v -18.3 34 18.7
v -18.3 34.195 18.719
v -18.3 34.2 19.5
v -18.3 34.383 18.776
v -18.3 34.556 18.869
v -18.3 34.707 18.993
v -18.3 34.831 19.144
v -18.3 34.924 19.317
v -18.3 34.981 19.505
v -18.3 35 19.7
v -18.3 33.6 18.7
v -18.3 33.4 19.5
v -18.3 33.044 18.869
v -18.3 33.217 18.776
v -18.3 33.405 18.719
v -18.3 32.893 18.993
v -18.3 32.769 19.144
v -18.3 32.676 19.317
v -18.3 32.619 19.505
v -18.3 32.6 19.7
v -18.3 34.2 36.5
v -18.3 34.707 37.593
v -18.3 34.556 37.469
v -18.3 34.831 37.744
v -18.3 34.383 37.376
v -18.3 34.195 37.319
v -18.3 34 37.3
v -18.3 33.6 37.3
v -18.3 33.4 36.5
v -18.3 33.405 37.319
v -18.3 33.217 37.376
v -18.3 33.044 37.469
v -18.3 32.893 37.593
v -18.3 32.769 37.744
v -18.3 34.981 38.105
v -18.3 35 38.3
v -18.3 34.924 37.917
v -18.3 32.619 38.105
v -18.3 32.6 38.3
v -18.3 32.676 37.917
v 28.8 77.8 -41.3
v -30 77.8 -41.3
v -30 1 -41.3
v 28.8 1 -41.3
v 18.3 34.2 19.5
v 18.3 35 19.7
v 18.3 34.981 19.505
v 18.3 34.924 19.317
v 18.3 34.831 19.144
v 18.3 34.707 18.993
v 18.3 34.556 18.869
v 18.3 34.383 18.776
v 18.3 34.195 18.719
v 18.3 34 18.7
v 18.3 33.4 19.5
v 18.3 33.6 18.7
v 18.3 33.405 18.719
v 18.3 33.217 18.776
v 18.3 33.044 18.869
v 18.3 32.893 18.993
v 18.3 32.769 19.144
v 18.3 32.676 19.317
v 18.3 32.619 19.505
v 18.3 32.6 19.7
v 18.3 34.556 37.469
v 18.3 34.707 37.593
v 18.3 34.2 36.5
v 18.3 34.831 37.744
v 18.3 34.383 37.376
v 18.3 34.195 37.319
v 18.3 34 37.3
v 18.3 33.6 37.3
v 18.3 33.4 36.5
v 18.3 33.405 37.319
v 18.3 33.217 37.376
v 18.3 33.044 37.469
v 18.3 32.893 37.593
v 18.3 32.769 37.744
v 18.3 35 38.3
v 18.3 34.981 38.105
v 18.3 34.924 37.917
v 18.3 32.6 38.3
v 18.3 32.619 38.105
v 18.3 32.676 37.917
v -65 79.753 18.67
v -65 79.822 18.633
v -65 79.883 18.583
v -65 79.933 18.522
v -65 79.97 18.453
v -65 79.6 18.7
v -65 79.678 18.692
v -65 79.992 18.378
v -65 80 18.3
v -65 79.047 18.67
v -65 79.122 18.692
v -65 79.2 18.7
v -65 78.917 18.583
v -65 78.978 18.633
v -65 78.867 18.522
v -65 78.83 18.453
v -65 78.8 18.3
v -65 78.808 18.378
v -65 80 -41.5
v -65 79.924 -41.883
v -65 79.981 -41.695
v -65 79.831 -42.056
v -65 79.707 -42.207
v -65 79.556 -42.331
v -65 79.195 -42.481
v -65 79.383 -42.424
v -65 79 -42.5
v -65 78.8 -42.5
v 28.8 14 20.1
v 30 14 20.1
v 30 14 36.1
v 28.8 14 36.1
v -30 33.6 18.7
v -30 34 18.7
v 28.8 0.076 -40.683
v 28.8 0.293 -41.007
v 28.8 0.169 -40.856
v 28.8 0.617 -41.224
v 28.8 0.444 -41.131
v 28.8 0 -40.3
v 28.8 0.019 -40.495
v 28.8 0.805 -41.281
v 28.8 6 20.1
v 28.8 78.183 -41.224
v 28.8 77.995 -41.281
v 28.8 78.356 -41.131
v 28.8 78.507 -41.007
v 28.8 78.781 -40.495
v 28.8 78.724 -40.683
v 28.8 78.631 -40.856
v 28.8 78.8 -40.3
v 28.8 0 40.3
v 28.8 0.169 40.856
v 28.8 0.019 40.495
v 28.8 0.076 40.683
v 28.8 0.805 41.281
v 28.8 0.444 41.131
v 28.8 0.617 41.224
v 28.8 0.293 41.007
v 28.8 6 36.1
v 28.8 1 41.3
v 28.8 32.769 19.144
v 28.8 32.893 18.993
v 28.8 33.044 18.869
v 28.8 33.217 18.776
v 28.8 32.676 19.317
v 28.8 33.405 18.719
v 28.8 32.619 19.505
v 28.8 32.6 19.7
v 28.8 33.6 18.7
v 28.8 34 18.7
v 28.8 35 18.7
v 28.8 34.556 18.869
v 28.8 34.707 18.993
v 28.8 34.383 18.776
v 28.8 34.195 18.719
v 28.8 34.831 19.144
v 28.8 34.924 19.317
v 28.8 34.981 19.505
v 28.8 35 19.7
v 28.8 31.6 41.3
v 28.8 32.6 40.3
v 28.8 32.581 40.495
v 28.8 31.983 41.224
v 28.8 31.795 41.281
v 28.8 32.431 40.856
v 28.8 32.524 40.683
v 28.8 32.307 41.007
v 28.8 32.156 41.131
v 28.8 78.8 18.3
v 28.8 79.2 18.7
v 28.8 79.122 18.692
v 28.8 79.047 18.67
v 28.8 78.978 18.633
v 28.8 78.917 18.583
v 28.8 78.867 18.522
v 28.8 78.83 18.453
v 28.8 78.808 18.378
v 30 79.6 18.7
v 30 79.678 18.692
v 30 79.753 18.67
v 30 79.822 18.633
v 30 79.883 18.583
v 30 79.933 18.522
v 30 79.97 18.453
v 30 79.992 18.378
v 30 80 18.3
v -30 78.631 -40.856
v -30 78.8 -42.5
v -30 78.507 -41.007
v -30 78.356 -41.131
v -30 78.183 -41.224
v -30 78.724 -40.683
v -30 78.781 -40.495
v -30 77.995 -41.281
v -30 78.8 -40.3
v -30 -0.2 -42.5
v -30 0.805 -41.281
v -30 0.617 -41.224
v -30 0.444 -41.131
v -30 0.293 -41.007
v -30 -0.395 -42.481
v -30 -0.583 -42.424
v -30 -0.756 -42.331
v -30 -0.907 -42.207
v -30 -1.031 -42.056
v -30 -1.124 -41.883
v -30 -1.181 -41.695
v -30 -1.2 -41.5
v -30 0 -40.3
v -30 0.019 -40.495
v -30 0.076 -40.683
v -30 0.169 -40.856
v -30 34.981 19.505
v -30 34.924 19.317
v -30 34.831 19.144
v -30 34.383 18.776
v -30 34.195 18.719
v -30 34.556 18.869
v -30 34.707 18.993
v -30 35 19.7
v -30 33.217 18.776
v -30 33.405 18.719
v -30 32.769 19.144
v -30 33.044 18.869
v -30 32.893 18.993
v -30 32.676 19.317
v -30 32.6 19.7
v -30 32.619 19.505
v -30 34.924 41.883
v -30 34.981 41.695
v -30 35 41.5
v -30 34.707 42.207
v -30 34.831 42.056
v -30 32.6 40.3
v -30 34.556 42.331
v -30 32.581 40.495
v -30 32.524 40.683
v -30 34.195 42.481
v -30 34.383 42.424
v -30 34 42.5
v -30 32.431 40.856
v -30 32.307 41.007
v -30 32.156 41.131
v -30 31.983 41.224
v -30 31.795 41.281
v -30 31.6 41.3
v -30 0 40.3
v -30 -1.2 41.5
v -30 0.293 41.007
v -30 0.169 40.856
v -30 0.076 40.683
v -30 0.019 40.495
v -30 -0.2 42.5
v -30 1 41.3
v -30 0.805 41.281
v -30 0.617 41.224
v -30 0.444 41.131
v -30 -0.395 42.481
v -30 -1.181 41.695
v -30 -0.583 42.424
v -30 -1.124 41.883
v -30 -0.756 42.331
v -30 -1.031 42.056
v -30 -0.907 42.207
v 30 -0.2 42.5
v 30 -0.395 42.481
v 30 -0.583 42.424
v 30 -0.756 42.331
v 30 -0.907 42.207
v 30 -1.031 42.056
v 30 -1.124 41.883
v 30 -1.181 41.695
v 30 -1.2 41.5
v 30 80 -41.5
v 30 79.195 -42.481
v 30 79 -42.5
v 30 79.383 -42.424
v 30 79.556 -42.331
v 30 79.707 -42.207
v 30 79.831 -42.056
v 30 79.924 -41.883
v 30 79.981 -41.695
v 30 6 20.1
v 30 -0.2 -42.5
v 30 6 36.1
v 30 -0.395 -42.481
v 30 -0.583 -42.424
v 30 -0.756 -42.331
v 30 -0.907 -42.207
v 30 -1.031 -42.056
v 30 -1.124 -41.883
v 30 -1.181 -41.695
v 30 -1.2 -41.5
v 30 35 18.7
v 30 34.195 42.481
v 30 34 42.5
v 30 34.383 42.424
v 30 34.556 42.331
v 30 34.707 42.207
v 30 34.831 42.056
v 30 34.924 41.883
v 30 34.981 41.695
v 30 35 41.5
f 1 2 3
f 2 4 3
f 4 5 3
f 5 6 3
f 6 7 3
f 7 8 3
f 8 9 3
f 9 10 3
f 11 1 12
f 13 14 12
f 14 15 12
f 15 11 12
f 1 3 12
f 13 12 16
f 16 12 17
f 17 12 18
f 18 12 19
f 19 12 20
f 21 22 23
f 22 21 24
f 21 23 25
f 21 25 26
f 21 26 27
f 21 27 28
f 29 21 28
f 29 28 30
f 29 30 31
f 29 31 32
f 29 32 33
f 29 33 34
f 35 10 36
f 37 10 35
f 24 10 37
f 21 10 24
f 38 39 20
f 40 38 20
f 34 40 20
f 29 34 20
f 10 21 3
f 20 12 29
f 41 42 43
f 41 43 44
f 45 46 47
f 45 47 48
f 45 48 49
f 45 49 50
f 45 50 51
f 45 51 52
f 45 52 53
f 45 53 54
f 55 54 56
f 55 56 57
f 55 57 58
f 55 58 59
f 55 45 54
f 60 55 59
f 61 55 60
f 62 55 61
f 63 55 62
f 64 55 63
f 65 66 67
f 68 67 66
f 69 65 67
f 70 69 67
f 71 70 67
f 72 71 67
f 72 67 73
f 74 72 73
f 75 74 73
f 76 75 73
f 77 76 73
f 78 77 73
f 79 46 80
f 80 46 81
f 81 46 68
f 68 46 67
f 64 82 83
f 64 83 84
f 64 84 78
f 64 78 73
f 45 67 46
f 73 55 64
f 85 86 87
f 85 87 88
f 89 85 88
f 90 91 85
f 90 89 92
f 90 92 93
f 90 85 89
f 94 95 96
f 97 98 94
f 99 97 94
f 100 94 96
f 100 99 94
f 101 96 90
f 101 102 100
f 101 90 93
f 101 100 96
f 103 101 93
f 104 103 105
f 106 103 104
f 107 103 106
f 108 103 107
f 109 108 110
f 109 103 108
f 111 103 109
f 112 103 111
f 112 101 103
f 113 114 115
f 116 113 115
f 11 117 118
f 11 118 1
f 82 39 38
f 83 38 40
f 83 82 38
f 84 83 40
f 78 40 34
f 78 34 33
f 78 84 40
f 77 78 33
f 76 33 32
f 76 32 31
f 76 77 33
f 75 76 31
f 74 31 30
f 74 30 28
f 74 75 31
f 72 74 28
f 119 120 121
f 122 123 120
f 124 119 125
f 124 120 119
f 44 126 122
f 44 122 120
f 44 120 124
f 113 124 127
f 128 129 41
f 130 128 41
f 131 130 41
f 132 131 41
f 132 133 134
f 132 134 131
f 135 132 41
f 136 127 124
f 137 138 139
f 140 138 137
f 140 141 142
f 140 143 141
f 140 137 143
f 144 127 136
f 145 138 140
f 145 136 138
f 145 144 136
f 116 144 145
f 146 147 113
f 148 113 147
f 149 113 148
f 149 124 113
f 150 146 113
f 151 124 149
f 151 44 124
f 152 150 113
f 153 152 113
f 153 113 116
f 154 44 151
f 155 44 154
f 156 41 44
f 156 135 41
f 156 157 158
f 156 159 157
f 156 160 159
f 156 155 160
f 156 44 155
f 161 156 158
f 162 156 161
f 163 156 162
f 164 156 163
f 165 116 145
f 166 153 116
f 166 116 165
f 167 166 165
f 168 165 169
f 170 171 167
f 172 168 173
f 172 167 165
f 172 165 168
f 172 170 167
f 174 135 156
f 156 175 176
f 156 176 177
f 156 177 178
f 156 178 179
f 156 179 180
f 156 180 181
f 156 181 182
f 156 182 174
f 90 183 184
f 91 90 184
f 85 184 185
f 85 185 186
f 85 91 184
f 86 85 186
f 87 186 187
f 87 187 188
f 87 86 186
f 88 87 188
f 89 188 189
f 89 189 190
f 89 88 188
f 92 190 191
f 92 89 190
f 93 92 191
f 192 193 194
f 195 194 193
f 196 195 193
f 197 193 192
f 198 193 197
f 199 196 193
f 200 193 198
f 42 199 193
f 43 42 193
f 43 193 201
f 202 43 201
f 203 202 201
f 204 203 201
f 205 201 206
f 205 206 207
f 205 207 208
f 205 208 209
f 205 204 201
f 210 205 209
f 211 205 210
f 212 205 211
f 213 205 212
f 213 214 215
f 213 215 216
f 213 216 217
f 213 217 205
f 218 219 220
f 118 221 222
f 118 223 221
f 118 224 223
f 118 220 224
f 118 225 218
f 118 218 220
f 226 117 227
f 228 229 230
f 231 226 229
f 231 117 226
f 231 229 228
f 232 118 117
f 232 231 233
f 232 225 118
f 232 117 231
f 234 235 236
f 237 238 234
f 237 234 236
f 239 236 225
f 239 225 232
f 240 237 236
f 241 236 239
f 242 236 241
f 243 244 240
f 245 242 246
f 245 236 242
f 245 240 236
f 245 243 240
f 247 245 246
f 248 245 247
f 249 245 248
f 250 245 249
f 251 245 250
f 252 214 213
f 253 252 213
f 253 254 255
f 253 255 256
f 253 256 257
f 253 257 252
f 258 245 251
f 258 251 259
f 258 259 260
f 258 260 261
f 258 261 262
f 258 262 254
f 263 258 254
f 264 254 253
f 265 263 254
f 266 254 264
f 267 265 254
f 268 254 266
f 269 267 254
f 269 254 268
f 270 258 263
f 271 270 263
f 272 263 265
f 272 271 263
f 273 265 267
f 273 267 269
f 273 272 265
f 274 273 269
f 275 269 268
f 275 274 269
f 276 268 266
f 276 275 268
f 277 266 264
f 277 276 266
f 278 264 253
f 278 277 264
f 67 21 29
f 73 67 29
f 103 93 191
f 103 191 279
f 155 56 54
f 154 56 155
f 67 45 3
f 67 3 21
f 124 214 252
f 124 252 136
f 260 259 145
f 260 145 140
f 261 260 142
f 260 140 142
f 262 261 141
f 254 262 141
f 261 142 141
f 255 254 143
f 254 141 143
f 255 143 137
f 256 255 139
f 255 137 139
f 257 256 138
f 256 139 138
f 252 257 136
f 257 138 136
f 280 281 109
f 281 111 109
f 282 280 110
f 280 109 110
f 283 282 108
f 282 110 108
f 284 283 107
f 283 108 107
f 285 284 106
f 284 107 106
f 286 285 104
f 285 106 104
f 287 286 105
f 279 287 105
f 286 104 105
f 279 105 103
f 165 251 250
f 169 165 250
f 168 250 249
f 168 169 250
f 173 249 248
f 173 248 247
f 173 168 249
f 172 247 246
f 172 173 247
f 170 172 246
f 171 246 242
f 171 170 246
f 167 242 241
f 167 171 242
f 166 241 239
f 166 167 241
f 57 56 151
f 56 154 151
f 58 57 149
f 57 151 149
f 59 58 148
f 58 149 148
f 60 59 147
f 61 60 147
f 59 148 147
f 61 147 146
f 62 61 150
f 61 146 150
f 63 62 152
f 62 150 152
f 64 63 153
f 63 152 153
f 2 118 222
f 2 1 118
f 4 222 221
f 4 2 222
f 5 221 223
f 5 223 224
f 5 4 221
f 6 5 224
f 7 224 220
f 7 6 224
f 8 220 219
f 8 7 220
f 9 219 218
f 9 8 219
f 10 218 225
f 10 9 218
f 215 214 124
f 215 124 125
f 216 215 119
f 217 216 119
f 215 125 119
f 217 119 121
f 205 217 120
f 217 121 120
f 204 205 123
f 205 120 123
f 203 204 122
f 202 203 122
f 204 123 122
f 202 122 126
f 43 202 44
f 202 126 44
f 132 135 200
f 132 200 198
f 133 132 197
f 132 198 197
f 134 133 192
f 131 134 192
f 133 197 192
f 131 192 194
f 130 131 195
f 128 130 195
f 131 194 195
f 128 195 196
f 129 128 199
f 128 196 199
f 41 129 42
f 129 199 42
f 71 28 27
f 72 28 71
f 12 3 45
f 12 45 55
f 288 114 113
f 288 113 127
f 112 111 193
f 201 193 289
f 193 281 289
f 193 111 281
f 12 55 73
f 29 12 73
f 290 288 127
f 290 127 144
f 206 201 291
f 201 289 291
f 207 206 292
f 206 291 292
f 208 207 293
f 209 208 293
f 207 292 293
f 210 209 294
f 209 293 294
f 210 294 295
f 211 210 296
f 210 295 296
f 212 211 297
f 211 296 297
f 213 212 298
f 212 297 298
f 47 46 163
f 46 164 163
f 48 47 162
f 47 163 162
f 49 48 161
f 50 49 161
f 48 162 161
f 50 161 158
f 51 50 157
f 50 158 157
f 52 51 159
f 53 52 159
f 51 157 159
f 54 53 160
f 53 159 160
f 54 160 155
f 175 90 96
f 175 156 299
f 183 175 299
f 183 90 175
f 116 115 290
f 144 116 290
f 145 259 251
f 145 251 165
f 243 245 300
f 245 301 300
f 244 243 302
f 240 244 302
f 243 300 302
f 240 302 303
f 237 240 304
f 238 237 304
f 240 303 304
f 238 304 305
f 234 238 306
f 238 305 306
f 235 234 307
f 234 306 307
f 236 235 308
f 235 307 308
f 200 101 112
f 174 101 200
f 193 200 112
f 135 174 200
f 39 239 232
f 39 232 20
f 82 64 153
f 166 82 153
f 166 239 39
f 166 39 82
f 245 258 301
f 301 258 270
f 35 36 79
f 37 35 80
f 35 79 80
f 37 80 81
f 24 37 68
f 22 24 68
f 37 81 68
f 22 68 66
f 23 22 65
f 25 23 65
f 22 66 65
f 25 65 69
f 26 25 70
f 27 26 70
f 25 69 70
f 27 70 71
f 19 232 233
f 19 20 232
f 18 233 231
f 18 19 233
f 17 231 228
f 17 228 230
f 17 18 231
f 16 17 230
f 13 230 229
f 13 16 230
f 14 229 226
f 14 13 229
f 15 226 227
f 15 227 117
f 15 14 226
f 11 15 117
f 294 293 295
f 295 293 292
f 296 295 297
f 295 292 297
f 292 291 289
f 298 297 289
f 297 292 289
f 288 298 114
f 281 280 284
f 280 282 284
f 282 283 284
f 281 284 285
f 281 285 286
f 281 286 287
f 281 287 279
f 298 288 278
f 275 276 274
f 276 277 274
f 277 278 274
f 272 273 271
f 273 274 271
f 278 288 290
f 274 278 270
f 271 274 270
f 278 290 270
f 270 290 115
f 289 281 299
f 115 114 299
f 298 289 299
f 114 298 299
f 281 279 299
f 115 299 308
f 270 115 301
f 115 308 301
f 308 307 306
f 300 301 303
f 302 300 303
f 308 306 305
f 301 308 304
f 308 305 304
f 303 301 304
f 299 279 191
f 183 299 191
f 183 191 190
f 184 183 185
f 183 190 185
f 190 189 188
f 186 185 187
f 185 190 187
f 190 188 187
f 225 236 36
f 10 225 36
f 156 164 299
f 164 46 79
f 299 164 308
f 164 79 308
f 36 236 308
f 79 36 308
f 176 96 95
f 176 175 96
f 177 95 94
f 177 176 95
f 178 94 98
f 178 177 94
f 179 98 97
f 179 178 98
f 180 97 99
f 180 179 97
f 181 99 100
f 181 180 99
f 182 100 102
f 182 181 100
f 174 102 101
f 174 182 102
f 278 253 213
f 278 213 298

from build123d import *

# Parameters (mm, degrees)
SKETCH_W     = 60
SKETCH_H     = 85
PAD_DEPTH    = 1.2
SKETCH002_W  = 60
SKETCH002_H  = 1.2
PAD001_DEPTH = 80
SKETCH003_W  = 60
SKETCH003_H  = 1.2
PAD002_DEPTH = 60
SKETCH004_W  = 60
SKETCH004_H  = 1.2
PAD003_DEPTH = 35
SKETCH006_W  = 60
SKETCH006_H  = 2.4
PAD004_DEPTH = 4
SKETCH005_W  = 11.7
SKETCH005_H  = 2.4
PAD005_DEPTH = 18.6
SKETCH007_W  = 17
SKETCH007_H  = 0.8
PAD006_DEPTH = 36.6
SKETCH009_W  = 61.2
SKETCH009_H  = 1.2
PAD007_DEPTH = 35
SKETCH010_W  = 1.2
SKETCH010_H  = 60
PAD008_DEPTH = 78.8
SKETCH011_W  = 1.2
SKETCH011_H  = 22.6
PAD009_DEPTH = 32.6
FILLET_R     = 1
FILLET001_R  = 1
FILLET002_R  = 1
FILLET003_R  = 1
FILLET004_R  = 1
FILLET005_R  = 1
FILLET006_R  = 1
FILLET007_R  = 1
FILLET008_R  = 1
FILLET009_R  = 1
FILLET010_R  = 1
FILLET011_R  = 1
FILLET012_R  = 1
FILLET013_R  = 1
FILLET014_R  = 0.4
FILLET015_R  = 0.4
SKETCH012_W  = 16
SKETCH012_H  = 8
POCKET_DEPTH = 95.001


with BuildPart() as part:
    # Sketch → Pad (new body)
    with BuildSketch(Plane.XZ):
        Rectangle(SKETCH_W, SKETCH_H)
    extrude(amount=PAD_DEPTH)

    # Sketch002 (on Face5 of Pad) → Pad001 (join)
    with BuildSketch(Plane(origin=(0, 0, 0), x_dir=(1, 0, 0), z_dir=(0, 1, 0))):
        with Locations((0, 41.9)):
            Rectangle(SKETCH002_W, SKETCH002_H)
    extrude(amount=PAD001_DEPTH)

    # Sketch003 (on Face4 of Pad001) → Pad002 (join)
    with BuildSketch(Plane(origin=(0, 0, -41.3), x_dir=(-1, 0, 0), z_dir=(0, 0, 1))):
        with Locations((0, -79.4)):
            Rectangle(SKETCH003_W, SKETCH003_H)
    extrude(amount=PAD002_DEPTH)

    # Sketch004 (on Face2 of Pad002) → Pad003 (join)
    with BuildSketch(Plane(origin=(0, 0, 0), x_dir=(1, 0, 0), z_dir=(0, 1, 0))):
        with Locations((0, -41.9)):
            Rectangle(SKETCH004_W, SKETCH004_H)
    extrude(amount=PAD003_DEPTH)

    # Sketch006 (on Face7 of Pad003) → Pad004 (join)
    with BuildSketch(Plane(origin=(0, 0, 41.3), x_dir=(1, 0, 0), z_dir=(0, 0, -1))):
        with Locations((0, -33.8)):
            Rectangle(SKETCH006_W, SKETCH006_H)
    extrude(amount=PAD004_DEPTH)

    # Sketch005 (on Face11 of Pad004) → Pad005 (join)
    with BuildSketch(Plane(origin=(0, 0, 37.3), x_dir=(1, 0, 0), z_dir=(0, 0, -1))):
        with Locations((24.15, -33.8)):
            Rectangle(SKETCH005_W, SKETCH005_H)
        with Locations((-24.15, -33.8)):
            Rectangle(SKETCH005_W, SKETCH005_H)
    extrude(amount=PAD005_DEPTH)

    # Sketch007 (on Face12 of Pad005) → Pad006 (join)
    with BuildSketch(Plane(origin=(-18.3, 0, 0), x_dir=(0, 0, 1), z_dir=(1, 0, 0))):
        with Locations((28, -33.8)):
            Rectangle(SKETCH007_W, SKETCH007_H)
    extrude(amount=PAD006_DEPTH)

    # Sketch009 (on Face2 of Pad006) → Pad007 (join)
    with BuildSketch(Plane(origin=(-30, 0, 0), x_dir=(0, 0, -1), z_dir=(-1, 0, 0))):
        with Locations((11.9, -79.4)):
            Rectangle(SKETCH009_W, SKETCH009_H)
    extrude(amount=PAD007_DEPTH)

    # Sketch010 (on Face22 of Pad007) → Pad008 (join)
    with BuildSketch(Plane.XZ.offset(-78.8)):
        with Locations((29.4, -11.3)):
            Rectangle(SKETCH010_W, SKETCH010_H)
    extrude(amount=PAD008_DEPTH)

    # Sketch011 (on Face9 of Pad008) → Pad009 (join)
    with BuildSketch(Plane.XZ.offset(-32.6)):
        with Locations((29.4, 30)):
            Rectangle(SKETCH011_W, SKETCH011_H)
    extrude(amount=PAD009_DEPTH)

    # Fillet
    fillet_edges = [part.edges().sort_by_distance(p)[0] for p in [
        (0, 35, 42.5),
    ]]
    fillet(fillet_edges, radius=FILLET_R)

    # Fillet001
    fillet001_edges = [part.edges().sort_by_distance(p)[0] for p in [
        (0, -1.2, 42.5),
    ]]
    fillet(fillet001_edges, radius=FILLET001_R)

    # Fillet002
    fillet002_edges = [part.edges().sort_by_distance(p)[0] for p in [
        (-0.6, 0, 41.3),
    ]]
    fillet(fillet002_edges, radius=FILLET002_R)

    # Fillet003
    fillet003_edges = [part.edges().sort_by_distance(p)[0] for p in [
        (-0.6, 32.6, 41.3),
    ]]
    fillet(fillet003_edges, radius=FILLET003_R)

    # Fillet004
    fillet004_edges = [part.edges().sort_by_distance(p)[0] for p in [
        (-24.15, 32.6, 18.7),
    ]]
    fillet(fillet004_edges, radius=FILLET004_R)

    # Fillet005
    fillet005_edges = [part.edges().sort_by_distance(p)[0] for p in [
        (-24.15, 35, 18.7),
    ]]
    fillet(fillet005_edges, radius=FILLET005_R)

    # Fillet006
    fillet006_edges = [part.edges().sort_by_distance(p)[0] for p in [
        (23.55, 35, 18.7),
    ]]
    fillet(fillet006_edges, radius=FILLET006_R)

    # Fillet007
    fillet007_edges = [part.edges().sort_by_distance(p)[0] for p in [
        (23.55, 32.6, 18.7),
    ]]
    fillet(fillet007_edges, radius=FILLET007_R)

    # Fillet008
    fillet008_edges = [part.edges().sort_by_distance(p)[0] for p in [
        (0, 32.6, 37.3),
    ]]
    fillet(fillet008_edges, radius=FILLET008_R)

    # Fillet009
    fillet009_edges = [part.edges().sort_by_distance(p)[0] for p in [
        (0, 35, 37.3),
    ]]
    fillet(fillet009_edges, radius=FILLET009_R)

    # Fillet010
    fillet010_edges = [part.edges().sort_by_distance(p)[0] for p in [
        (0, -1.2, -42.5),
    ]]
    fillet(fillet010_edges, radius=FILLET010_R)

    # Fillet011
    fillet011_edges = [part.edges().sort_by_distance(p)[0] for p in [
        (-17.5, 80, -42.5),
    ]]
    fillet(fillet011_edges, radius=FILLET011_R)

    # Fillet012
    fillet012_edges = [part.edges().sort_by_distance(p)[0] for p in [
        (-0.6, 78.8, -41.3),
    ]]
    fillet(fillet012_edges, radius=FILLET012_R)

    # Fillet013
    fillet013_edges = [part.edges().sort_by_distance(p)[0] for p in [
        (-0.6, 0, -41.3),
    ]]
    fillet(fillet013_edges, radius=FILLET013_R)

    # Fillet014
    fillet014_edges = [part.edges().sort_by_distance(p)[0] for p in [
        (-17.5, 80, 18.7),
    ]]
    fillet(fillet014_edges, radius=FILLET014_R)

    # Fillet015
    fillet015_edges = [part.edges().sort_by_distance(p)[0] for p in [
        (-18.1, 78.8, 18.7),
    ]]
    fillet(fillet015_edges, radius=FILLET015_R)

    # Sketch012 (on Face23 of Pad009) → Pocket (cut, through all)
    with BuildSketch(Plane(origin=(30, 0, 0), x_dir=(0, 0, 1), z_dir=(1, 0, 0))):
        with Locations((28.1, -10)):
            Rectangle(SKETCH012_W, SKETCH012_H)
    extrude(amount=-POCKET_DEPTH, mode=Mode.SUBTRACT)


solid = part.part
